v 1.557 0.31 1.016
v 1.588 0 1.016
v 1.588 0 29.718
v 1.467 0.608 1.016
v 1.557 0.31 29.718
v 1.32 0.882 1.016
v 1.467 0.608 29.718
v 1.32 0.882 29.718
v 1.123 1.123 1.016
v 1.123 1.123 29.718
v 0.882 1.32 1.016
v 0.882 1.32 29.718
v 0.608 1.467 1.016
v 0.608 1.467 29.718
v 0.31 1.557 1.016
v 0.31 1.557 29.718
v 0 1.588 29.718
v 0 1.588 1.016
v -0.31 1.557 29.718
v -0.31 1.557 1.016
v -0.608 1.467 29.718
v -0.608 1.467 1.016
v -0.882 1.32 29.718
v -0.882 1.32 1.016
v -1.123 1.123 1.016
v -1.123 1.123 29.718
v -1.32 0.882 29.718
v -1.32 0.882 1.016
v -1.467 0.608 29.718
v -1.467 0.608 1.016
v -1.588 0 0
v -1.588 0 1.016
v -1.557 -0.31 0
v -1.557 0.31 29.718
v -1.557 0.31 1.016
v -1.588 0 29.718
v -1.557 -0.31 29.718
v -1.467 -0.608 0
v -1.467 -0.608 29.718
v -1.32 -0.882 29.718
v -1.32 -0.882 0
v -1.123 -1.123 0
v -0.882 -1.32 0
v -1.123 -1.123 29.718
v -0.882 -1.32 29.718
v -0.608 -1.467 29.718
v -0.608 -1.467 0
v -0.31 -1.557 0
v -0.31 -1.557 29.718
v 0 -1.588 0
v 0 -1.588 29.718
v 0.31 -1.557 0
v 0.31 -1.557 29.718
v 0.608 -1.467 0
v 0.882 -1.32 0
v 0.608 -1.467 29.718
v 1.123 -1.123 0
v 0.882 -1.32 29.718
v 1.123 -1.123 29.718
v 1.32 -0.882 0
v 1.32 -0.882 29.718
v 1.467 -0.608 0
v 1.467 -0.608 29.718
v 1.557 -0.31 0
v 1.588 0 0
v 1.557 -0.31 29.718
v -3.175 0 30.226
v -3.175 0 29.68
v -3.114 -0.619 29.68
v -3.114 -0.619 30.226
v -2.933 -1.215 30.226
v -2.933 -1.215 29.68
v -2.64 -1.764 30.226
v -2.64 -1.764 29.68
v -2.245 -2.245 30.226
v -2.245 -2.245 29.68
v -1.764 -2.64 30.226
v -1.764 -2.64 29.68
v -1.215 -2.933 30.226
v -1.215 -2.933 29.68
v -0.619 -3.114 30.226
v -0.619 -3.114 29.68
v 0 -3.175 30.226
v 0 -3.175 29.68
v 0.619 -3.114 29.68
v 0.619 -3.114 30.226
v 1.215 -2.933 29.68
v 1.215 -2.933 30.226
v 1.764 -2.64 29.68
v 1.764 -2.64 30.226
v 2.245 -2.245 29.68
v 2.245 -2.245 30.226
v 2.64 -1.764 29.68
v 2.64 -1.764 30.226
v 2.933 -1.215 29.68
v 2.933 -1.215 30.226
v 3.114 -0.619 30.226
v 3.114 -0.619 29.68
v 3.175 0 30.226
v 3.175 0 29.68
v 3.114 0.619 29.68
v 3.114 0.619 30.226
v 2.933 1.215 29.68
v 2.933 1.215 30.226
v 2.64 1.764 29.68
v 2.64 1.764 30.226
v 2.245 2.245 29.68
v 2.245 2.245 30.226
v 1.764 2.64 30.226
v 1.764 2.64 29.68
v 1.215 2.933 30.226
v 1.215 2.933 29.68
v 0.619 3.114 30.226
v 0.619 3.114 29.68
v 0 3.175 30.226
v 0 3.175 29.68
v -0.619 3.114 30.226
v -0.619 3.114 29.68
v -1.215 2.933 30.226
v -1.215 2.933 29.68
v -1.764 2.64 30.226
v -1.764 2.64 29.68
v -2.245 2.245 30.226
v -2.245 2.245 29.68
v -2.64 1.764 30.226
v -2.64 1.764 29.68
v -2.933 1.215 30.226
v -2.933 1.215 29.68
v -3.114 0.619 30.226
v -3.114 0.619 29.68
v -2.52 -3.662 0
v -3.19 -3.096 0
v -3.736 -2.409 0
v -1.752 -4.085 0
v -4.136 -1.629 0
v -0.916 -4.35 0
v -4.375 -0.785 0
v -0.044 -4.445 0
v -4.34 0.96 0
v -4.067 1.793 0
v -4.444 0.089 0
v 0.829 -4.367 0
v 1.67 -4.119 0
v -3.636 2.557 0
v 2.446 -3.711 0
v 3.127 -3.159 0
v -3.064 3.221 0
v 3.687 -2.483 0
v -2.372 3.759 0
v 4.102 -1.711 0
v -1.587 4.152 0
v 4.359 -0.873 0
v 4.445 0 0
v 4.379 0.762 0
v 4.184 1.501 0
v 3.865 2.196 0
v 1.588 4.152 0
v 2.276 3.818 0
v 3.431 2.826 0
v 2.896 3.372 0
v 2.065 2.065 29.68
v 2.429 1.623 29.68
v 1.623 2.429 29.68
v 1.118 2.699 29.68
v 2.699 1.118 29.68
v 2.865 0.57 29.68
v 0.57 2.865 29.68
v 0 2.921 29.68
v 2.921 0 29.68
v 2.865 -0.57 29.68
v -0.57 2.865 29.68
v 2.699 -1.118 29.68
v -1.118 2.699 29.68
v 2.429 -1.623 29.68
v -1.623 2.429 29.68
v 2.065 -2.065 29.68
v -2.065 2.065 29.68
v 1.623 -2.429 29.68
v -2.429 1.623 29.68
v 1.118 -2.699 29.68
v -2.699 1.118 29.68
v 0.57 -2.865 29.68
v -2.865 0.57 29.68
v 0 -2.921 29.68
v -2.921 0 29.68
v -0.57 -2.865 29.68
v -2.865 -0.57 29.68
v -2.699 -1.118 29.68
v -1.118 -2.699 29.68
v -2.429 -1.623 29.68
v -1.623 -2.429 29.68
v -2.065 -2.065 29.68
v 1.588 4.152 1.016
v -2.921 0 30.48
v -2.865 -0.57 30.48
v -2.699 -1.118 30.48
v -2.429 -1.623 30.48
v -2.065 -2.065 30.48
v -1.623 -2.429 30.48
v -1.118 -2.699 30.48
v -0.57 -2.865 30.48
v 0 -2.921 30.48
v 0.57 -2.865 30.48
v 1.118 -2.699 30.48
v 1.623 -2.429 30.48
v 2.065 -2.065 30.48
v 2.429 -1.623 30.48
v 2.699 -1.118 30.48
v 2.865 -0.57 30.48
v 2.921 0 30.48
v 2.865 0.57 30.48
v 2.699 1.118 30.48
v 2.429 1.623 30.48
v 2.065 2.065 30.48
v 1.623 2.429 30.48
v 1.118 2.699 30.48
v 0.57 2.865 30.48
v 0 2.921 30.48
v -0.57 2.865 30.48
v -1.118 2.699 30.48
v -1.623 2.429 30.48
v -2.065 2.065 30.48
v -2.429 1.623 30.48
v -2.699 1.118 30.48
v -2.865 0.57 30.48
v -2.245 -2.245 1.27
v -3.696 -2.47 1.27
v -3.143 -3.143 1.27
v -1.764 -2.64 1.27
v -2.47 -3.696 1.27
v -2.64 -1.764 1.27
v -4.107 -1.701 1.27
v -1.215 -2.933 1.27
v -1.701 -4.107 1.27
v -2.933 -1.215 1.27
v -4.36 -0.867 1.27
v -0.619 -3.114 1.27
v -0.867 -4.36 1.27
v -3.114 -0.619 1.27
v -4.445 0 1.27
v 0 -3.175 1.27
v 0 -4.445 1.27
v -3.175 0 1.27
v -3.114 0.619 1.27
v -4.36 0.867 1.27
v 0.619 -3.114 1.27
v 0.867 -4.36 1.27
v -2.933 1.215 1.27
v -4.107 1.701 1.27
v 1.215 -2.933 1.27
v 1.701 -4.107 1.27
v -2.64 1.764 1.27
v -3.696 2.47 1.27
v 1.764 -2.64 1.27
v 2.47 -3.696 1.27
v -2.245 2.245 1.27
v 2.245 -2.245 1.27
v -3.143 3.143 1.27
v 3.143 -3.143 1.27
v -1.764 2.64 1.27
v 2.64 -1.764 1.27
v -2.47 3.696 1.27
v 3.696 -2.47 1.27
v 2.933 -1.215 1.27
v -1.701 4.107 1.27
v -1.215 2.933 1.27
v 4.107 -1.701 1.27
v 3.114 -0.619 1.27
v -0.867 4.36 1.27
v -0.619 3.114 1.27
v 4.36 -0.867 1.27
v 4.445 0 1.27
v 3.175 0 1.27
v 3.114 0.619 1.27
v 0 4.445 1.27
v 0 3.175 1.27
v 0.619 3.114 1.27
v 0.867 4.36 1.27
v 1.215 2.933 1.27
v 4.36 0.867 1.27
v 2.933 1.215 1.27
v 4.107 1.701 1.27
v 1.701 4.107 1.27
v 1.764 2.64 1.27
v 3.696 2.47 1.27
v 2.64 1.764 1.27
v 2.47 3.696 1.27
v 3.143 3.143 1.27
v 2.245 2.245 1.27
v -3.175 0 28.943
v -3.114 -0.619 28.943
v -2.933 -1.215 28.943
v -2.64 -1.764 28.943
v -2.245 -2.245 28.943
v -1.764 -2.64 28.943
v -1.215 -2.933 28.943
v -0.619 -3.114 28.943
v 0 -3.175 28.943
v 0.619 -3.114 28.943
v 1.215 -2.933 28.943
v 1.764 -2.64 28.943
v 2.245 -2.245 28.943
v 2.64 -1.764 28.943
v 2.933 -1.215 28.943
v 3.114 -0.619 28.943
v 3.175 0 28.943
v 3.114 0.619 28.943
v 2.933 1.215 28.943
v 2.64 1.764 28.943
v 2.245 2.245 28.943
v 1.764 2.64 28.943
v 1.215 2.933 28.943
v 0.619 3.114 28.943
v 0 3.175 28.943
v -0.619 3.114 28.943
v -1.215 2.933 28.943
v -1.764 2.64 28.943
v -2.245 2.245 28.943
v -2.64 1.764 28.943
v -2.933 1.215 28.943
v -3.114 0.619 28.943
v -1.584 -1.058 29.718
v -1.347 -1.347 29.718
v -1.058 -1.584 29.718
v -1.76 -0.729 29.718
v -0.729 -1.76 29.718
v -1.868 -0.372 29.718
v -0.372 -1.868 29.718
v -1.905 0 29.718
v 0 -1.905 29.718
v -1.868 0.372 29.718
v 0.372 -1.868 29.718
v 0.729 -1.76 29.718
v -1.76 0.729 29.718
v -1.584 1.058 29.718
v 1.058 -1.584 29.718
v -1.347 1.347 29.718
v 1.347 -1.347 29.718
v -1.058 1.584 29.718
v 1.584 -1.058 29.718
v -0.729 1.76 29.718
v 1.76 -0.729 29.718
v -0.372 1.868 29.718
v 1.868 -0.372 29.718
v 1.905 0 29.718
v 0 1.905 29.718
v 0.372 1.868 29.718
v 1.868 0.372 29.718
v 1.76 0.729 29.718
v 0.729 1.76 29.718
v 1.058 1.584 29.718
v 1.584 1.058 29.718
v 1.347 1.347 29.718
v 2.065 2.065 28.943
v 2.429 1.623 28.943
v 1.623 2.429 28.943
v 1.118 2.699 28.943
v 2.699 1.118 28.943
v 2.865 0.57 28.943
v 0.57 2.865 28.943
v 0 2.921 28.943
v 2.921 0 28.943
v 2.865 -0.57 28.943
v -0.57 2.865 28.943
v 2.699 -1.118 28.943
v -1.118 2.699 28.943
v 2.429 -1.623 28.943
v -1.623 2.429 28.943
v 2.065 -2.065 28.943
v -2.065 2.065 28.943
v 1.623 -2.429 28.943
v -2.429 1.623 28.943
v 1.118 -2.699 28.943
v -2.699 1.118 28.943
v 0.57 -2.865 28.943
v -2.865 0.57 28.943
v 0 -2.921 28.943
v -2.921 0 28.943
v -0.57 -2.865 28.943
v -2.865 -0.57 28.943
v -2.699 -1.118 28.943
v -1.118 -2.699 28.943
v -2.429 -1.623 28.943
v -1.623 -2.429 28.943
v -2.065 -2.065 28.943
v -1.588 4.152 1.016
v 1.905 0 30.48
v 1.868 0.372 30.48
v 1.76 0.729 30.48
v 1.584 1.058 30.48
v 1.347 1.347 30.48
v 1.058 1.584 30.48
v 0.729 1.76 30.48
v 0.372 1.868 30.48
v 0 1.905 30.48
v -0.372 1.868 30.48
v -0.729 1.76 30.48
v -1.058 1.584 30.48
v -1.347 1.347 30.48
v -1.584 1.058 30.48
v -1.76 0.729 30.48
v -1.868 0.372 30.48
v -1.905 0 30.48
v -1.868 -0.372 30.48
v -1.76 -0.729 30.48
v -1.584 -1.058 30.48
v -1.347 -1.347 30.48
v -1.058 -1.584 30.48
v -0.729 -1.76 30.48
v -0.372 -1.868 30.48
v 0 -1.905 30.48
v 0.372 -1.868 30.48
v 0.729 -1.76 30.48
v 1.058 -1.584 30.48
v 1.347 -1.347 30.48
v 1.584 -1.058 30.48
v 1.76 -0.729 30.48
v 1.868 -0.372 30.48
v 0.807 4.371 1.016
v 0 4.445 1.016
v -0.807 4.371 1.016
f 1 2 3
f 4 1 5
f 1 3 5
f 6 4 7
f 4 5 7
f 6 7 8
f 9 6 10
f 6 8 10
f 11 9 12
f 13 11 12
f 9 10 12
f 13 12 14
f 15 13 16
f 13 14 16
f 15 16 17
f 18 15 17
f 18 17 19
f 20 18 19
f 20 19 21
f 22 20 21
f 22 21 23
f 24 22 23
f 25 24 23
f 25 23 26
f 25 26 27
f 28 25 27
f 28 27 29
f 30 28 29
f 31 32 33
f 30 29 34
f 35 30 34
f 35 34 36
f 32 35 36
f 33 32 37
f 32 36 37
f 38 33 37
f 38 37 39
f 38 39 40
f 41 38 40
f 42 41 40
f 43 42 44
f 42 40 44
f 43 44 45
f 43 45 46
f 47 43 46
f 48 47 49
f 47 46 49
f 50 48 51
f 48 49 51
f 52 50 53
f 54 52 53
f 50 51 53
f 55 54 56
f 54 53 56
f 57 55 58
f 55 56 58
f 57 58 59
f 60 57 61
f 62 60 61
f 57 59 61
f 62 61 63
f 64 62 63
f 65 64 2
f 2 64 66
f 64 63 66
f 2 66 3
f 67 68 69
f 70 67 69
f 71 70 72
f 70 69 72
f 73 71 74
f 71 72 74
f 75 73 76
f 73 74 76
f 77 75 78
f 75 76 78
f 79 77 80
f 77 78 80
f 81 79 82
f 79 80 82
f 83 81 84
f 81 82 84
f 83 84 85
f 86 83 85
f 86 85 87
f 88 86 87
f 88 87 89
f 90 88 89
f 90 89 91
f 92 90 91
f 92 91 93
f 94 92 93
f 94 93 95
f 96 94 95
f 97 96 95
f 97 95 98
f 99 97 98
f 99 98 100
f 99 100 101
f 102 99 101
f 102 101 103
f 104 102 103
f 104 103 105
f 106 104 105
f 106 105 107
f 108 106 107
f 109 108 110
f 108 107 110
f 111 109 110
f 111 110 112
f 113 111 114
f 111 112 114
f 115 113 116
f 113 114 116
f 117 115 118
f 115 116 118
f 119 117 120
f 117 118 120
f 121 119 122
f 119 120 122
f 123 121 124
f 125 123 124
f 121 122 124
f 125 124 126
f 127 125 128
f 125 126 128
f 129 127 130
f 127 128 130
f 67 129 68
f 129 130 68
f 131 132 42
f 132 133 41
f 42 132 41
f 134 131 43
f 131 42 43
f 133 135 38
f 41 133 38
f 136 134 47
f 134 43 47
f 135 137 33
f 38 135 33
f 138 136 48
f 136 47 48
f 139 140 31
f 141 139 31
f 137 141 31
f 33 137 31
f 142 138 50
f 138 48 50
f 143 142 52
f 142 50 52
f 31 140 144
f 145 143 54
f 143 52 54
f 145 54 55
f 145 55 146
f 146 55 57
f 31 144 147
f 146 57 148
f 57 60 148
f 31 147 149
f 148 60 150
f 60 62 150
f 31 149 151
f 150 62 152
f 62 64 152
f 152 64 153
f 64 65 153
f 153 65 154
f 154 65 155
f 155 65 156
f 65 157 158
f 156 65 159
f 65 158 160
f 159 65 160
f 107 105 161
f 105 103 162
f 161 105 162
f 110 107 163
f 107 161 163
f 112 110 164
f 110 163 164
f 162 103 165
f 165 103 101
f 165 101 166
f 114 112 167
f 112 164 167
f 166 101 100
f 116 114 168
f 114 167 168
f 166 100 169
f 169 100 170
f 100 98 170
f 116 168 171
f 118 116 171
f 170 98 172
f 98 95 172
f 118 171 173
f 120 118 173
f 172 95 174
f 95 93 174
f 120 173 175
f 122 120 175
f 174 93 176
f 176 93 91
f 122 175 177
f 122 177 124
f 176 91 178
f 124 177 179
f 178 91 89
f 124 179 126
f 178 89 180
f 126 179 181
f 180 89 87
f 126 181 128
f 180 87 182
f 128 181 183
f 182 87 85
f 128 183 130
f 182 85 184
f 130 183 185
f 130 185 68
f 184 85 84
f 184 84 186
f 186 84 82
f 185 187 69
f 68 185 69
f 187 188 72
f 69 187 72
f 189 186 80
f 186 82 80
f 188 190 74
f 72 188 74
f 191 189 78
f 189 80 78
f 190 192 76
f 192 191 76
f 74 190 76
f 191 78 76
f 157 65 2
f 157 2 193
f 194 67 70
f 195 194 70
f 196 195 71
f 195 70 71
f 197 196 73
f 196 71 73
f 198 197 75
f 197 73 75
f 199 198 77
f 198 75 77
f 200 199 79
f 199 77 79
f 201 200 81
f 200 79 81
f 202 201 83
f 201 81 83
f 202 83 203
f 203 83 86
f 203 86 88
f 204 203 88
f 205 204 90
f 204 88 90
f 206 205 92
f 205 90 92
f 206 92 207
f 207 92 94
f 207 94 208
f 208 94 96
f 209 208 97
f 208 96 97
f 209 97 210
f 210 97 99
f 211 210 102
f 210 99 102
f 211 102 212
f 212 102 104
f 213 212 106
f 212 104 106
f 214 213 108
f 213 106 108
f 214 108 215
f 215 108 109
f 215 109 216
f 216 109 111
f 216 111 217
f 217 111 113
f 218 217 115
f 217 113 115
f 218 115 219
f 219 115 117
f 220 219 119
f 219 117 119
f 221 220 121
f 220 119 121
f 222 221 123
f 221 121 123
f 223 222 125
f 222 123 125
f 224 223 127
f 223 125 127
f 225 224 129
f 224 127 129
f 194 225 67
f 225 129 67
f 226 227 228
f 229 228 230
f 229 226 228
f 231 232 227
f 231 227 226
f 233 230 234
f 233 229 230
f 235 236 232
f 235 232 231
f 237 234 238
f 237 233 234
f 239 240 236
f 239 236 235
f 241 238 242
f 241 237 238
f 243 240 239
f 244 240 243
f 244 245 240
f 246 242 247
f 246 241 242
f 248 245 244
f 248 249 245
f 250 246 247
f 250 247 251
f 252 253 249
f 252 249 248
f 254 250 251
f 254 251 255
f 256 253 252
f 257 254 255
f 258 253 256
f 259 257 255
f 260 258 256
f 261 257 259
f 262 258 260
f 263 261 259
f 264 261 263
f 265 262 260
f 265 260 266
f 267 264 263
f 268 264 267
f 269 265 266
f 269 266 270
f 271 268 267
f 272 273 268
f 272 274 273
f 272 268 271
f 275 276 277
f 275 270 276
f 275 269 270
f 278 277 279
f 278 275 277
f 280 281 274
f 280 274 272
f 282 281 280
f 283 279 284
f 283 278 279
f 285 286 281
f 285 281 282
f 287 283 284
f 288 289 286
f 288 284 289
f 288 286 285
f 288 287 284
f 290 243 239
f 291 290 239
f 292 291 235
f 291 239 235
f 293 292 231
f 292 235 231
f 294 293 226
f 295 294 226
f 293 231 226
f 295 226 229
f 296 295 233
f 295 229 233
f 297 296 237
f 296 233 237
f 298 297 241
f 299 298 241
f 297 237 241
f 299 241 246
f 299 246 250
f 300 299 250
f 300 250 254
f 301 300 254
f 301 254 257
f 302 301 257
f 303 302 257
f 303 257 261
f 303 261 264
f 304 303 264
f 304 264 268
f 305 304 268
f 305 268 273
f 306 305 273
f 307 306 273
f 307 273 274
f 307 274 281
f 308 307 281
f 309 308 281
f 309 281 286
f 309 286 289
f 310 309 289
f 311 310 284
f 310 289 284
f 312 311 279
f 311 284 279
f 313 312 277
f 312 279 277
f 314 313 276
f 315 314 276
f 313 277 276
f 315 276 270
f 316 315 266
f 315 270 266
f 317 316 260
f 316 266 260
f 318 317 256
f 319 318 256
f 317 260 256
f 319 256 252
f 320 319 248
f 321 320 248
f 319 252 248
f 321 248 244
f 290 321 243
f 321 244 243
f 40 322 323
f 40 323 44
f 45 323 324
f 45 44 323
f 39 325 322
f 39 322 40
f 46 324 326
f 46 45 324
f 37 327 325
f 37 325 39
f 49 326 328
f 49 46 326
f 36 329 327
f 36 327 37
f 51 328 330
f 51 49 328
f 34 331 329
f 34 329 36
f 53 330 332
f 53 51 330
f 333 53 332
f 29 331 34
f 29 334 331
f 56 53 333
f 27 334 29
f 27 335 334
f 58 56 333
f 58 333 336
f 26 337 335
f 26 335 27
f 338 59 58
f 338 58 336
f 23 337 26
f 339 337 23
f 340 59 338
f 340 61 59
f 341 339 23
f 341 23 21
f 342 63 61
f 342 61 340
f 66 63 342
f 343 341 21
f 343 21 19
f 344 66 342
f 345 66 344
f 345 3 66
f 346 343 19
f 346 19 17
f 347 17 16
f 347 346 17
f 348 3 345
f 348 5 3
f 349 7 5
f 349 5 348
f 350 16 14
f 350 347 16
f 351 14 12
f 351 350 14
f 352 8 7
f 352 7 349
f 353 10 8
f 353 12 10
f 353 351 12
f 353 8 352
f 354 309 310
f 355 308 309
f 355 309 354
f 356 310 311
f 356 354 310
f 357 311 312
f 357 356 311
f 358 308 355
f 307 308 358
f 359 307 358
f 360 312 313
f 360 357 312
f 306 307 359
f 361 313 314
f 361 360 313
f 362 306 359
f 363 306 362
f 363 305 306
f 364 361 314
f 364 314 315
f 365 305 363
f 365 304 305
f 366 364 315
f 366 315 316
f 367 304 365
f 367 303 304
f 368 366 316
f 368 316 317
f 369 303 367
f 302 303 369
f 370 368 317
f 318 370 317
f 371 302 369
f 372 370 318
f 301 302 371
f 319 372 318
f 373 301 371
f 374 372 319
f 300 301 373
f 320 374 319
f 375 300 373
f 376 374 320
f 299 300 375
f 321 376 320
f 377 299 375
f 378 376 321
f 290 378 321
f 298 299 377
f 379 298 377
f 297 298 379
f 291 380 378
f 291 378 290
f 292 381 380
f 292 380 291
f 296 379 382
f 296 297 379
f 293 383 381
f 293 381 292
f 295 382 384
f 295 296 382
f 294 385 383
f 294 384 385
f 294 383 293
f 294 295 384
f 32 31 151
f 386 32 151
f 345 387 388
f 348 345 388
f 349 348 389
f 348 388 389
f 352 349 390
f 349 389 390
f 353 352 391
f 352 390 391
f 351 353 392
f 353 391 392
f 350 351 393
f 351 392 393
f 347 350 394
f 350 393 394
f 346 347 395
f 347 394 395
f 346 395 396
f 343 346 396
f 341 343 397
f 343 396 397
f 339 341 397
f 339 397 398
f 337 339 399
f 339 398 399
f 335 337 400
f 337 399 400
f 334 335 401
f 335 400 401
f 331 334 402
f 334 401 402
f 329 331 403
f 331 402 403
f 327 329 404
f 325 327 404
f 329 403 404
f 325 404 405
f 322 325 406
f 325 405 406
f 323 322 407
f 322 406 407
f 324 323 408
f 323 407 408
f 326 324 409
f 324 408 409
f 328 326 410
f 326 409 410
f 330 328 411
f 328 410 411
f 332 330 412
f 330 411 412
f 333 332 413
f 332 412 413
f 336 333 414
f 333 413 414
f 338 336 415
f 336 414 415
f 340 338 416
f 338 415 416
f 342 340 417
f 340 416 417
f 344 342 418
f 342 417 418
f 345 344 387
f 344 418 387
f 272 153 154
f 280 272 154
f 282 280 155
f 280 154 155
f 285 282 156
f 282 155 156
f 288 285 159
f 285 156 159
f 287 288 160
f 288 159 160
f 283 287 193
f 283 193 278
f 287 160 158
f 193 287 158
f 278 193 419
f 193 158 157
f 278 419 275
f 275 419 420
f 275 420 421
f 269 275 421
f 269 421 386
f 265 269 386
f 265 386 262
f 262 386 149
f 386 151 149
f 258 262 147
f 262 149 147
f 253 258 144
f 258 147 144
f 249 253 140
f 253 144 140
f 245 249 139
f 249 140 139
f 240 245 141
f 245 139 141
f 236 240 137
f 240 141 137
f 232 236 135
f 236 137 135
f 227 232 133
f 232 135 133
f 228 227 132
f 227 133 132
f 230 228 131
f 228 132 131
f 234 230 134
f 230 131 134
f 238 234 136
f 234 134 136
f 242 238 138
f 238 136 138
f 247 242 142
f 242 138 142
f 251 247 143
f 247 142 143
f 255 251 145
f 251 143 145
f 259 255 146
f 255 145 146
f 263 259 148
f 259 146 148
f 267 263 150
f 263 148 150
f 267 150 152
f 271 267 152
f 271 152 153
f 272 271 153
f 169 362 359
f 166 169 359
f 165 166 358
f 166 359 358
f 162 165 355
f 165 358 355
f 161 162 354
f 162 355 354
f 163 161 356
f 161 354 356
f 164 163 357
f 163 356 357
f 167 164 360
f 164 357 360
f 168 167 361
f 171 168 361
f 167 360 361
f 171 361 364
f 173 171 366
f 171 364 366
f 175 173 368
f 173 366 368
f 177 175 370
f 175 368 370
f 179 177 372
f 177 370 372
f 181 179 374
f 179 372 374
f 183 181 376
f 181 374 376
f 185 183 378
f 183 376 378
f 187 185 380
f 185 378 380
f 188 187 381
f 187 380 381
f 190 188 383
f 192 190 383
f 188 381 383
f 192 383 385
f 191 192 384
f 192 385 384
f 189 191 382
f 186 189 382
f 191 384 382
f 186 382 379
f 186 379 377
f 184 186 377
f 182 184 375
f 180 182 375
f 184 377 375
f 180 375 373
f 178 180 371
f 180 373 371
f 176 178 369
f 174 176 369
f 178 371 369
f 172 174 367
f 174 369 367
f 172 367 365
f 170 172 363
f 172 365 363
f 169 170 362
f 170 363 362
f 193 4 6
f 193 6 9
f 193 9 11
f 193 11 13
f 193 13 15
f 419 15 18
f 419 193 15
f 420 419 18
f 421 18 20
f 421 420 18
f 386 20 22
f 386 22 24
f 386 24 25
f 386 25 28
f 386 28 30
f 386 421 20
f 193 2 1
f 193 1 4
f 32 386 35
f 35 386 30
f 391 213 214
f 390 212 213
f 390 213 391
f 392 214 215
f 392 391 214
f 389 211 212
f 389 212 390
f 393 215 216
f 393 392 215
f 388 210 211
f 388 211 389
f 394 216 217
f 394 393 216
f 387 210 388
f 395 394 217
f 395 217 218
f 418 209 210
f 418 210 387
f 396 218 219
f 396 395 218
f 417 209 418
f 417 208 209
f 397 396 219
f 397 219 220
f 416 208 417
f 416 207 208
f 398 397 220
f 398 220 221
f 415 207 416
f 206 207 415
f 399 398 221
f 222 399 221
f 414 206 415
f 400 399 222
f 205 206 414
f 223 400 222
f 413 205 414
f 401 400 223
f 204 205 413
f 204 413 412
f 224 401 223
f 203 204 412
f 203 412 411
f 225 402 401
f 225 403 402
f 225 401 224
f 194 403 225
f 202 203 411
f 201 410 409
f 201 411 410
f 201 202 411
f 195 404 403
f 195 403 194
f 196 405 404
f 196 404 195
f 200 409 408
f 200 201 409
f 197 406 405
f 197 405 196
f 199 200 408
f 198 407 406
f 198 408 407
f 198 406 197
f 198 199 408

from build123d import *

# Parameters (mm, degrees)
SKETCH2_R           = 4.445
BOSS_EXTRUDE1_DEPTH = 1.27
SKETCH3_R           = 3.175
BOSS_EXTRUDE2_DEPTH = 29.21
SKETCH4_R           = 1.5875
CUT_EXTRUDE1_DEPTH  = 37.592
SKETCH5_R           = 1.905
CUT_EXTRUDE2_DEPTH  = 0.762
SKETCH6_W           = 3.175
SKETCH6_H           = 5.873367688
CUT_EXTRUDE3_DEPTH  = 1.016
CUT_EXTRUDE5_START  = -0.7366
SKETCH7_R           = 3.175
SKETCH7_R_2         = 2.921
CUT_EXTRUDE5_DEPTH  = 0.7366
CHAMFER1_SIZE       = 0.254


with BuildPart() as part:
    # Sketch2 → Boss-Extrude1 (new body)
    with BuildSketch(Plane.XY):
        Circle(SKETCH2_R)
    extrude(amount=BOSS_EXTRUDE1_DEPTH)

    # Sketch3 → Boss-Extrude2 (add)
    with BuildSketch(Plane.XY.offset(1.27)):
        with Locations(Location((0, 0, 0), (0, 0, 180))):
            Circle(SKETCH3_R)
    extrude(amount=BOSS_EXTRUDE2_DEPTH)

    # Sketch4 → Cut-Extrude1 (cut)
    with BuildSketch(Plane.XY.offset(30.48)):
        Circle(SKETCH4_R)
    extrude(amount=-CUT_EXTRUDE1_DEPTH, mode=Mode.SUBTRACT)

    # Sketch5 → Cut-Extrude2 (cut)
    with BuildSketch(Plane.XY.offset(30.48)):
        Circle(SKETCH5_R)
    extrude(amount=-CUT_EXTRUDE2_DEPTH, mode=Mode.SUBTRACT)

    # Sketch6 → Cut-Extrude3 (cut)
    with BuildSketch(Plane(origin=(0, 0, 0), x_dir=(-1, 0, 0), z_dir=(0, 0, -1))):
        with Locations((0, 2.936683844)):
            Rectangle(SKETCH6_W, SKETCH6_H)
    extrude(amount=-CUT_EXTRUDE3_DEPTH, mode=Mode.SUBTRACT)

    # Sketch7 → Cut-Extrude5 (cut)
    with BuildSketch(Plane.XY.offset(29.6799).offset(CUT_EXTRUDE5_START)):
        with Locations(Location((0, 0, 0), (0, 0, 180))):
            Circle(SKETCH7_R)
        Circle(SKETCH7_R_2, mode=Mode.SUBTRACT)
    extrude(amount=CUT_EXTRUDE5_DEPTH, mode=Mode.SUBTRACT)

    # Chamfer1
    chamfer1_edges = [part.edges().sort_by_distance(p)[0] for p in [
        (3.175, 0, 30.48),
    ]]
    chamfer(chamfer1_edges, length=CHAMFER1_SIZE)


solid = part.part
